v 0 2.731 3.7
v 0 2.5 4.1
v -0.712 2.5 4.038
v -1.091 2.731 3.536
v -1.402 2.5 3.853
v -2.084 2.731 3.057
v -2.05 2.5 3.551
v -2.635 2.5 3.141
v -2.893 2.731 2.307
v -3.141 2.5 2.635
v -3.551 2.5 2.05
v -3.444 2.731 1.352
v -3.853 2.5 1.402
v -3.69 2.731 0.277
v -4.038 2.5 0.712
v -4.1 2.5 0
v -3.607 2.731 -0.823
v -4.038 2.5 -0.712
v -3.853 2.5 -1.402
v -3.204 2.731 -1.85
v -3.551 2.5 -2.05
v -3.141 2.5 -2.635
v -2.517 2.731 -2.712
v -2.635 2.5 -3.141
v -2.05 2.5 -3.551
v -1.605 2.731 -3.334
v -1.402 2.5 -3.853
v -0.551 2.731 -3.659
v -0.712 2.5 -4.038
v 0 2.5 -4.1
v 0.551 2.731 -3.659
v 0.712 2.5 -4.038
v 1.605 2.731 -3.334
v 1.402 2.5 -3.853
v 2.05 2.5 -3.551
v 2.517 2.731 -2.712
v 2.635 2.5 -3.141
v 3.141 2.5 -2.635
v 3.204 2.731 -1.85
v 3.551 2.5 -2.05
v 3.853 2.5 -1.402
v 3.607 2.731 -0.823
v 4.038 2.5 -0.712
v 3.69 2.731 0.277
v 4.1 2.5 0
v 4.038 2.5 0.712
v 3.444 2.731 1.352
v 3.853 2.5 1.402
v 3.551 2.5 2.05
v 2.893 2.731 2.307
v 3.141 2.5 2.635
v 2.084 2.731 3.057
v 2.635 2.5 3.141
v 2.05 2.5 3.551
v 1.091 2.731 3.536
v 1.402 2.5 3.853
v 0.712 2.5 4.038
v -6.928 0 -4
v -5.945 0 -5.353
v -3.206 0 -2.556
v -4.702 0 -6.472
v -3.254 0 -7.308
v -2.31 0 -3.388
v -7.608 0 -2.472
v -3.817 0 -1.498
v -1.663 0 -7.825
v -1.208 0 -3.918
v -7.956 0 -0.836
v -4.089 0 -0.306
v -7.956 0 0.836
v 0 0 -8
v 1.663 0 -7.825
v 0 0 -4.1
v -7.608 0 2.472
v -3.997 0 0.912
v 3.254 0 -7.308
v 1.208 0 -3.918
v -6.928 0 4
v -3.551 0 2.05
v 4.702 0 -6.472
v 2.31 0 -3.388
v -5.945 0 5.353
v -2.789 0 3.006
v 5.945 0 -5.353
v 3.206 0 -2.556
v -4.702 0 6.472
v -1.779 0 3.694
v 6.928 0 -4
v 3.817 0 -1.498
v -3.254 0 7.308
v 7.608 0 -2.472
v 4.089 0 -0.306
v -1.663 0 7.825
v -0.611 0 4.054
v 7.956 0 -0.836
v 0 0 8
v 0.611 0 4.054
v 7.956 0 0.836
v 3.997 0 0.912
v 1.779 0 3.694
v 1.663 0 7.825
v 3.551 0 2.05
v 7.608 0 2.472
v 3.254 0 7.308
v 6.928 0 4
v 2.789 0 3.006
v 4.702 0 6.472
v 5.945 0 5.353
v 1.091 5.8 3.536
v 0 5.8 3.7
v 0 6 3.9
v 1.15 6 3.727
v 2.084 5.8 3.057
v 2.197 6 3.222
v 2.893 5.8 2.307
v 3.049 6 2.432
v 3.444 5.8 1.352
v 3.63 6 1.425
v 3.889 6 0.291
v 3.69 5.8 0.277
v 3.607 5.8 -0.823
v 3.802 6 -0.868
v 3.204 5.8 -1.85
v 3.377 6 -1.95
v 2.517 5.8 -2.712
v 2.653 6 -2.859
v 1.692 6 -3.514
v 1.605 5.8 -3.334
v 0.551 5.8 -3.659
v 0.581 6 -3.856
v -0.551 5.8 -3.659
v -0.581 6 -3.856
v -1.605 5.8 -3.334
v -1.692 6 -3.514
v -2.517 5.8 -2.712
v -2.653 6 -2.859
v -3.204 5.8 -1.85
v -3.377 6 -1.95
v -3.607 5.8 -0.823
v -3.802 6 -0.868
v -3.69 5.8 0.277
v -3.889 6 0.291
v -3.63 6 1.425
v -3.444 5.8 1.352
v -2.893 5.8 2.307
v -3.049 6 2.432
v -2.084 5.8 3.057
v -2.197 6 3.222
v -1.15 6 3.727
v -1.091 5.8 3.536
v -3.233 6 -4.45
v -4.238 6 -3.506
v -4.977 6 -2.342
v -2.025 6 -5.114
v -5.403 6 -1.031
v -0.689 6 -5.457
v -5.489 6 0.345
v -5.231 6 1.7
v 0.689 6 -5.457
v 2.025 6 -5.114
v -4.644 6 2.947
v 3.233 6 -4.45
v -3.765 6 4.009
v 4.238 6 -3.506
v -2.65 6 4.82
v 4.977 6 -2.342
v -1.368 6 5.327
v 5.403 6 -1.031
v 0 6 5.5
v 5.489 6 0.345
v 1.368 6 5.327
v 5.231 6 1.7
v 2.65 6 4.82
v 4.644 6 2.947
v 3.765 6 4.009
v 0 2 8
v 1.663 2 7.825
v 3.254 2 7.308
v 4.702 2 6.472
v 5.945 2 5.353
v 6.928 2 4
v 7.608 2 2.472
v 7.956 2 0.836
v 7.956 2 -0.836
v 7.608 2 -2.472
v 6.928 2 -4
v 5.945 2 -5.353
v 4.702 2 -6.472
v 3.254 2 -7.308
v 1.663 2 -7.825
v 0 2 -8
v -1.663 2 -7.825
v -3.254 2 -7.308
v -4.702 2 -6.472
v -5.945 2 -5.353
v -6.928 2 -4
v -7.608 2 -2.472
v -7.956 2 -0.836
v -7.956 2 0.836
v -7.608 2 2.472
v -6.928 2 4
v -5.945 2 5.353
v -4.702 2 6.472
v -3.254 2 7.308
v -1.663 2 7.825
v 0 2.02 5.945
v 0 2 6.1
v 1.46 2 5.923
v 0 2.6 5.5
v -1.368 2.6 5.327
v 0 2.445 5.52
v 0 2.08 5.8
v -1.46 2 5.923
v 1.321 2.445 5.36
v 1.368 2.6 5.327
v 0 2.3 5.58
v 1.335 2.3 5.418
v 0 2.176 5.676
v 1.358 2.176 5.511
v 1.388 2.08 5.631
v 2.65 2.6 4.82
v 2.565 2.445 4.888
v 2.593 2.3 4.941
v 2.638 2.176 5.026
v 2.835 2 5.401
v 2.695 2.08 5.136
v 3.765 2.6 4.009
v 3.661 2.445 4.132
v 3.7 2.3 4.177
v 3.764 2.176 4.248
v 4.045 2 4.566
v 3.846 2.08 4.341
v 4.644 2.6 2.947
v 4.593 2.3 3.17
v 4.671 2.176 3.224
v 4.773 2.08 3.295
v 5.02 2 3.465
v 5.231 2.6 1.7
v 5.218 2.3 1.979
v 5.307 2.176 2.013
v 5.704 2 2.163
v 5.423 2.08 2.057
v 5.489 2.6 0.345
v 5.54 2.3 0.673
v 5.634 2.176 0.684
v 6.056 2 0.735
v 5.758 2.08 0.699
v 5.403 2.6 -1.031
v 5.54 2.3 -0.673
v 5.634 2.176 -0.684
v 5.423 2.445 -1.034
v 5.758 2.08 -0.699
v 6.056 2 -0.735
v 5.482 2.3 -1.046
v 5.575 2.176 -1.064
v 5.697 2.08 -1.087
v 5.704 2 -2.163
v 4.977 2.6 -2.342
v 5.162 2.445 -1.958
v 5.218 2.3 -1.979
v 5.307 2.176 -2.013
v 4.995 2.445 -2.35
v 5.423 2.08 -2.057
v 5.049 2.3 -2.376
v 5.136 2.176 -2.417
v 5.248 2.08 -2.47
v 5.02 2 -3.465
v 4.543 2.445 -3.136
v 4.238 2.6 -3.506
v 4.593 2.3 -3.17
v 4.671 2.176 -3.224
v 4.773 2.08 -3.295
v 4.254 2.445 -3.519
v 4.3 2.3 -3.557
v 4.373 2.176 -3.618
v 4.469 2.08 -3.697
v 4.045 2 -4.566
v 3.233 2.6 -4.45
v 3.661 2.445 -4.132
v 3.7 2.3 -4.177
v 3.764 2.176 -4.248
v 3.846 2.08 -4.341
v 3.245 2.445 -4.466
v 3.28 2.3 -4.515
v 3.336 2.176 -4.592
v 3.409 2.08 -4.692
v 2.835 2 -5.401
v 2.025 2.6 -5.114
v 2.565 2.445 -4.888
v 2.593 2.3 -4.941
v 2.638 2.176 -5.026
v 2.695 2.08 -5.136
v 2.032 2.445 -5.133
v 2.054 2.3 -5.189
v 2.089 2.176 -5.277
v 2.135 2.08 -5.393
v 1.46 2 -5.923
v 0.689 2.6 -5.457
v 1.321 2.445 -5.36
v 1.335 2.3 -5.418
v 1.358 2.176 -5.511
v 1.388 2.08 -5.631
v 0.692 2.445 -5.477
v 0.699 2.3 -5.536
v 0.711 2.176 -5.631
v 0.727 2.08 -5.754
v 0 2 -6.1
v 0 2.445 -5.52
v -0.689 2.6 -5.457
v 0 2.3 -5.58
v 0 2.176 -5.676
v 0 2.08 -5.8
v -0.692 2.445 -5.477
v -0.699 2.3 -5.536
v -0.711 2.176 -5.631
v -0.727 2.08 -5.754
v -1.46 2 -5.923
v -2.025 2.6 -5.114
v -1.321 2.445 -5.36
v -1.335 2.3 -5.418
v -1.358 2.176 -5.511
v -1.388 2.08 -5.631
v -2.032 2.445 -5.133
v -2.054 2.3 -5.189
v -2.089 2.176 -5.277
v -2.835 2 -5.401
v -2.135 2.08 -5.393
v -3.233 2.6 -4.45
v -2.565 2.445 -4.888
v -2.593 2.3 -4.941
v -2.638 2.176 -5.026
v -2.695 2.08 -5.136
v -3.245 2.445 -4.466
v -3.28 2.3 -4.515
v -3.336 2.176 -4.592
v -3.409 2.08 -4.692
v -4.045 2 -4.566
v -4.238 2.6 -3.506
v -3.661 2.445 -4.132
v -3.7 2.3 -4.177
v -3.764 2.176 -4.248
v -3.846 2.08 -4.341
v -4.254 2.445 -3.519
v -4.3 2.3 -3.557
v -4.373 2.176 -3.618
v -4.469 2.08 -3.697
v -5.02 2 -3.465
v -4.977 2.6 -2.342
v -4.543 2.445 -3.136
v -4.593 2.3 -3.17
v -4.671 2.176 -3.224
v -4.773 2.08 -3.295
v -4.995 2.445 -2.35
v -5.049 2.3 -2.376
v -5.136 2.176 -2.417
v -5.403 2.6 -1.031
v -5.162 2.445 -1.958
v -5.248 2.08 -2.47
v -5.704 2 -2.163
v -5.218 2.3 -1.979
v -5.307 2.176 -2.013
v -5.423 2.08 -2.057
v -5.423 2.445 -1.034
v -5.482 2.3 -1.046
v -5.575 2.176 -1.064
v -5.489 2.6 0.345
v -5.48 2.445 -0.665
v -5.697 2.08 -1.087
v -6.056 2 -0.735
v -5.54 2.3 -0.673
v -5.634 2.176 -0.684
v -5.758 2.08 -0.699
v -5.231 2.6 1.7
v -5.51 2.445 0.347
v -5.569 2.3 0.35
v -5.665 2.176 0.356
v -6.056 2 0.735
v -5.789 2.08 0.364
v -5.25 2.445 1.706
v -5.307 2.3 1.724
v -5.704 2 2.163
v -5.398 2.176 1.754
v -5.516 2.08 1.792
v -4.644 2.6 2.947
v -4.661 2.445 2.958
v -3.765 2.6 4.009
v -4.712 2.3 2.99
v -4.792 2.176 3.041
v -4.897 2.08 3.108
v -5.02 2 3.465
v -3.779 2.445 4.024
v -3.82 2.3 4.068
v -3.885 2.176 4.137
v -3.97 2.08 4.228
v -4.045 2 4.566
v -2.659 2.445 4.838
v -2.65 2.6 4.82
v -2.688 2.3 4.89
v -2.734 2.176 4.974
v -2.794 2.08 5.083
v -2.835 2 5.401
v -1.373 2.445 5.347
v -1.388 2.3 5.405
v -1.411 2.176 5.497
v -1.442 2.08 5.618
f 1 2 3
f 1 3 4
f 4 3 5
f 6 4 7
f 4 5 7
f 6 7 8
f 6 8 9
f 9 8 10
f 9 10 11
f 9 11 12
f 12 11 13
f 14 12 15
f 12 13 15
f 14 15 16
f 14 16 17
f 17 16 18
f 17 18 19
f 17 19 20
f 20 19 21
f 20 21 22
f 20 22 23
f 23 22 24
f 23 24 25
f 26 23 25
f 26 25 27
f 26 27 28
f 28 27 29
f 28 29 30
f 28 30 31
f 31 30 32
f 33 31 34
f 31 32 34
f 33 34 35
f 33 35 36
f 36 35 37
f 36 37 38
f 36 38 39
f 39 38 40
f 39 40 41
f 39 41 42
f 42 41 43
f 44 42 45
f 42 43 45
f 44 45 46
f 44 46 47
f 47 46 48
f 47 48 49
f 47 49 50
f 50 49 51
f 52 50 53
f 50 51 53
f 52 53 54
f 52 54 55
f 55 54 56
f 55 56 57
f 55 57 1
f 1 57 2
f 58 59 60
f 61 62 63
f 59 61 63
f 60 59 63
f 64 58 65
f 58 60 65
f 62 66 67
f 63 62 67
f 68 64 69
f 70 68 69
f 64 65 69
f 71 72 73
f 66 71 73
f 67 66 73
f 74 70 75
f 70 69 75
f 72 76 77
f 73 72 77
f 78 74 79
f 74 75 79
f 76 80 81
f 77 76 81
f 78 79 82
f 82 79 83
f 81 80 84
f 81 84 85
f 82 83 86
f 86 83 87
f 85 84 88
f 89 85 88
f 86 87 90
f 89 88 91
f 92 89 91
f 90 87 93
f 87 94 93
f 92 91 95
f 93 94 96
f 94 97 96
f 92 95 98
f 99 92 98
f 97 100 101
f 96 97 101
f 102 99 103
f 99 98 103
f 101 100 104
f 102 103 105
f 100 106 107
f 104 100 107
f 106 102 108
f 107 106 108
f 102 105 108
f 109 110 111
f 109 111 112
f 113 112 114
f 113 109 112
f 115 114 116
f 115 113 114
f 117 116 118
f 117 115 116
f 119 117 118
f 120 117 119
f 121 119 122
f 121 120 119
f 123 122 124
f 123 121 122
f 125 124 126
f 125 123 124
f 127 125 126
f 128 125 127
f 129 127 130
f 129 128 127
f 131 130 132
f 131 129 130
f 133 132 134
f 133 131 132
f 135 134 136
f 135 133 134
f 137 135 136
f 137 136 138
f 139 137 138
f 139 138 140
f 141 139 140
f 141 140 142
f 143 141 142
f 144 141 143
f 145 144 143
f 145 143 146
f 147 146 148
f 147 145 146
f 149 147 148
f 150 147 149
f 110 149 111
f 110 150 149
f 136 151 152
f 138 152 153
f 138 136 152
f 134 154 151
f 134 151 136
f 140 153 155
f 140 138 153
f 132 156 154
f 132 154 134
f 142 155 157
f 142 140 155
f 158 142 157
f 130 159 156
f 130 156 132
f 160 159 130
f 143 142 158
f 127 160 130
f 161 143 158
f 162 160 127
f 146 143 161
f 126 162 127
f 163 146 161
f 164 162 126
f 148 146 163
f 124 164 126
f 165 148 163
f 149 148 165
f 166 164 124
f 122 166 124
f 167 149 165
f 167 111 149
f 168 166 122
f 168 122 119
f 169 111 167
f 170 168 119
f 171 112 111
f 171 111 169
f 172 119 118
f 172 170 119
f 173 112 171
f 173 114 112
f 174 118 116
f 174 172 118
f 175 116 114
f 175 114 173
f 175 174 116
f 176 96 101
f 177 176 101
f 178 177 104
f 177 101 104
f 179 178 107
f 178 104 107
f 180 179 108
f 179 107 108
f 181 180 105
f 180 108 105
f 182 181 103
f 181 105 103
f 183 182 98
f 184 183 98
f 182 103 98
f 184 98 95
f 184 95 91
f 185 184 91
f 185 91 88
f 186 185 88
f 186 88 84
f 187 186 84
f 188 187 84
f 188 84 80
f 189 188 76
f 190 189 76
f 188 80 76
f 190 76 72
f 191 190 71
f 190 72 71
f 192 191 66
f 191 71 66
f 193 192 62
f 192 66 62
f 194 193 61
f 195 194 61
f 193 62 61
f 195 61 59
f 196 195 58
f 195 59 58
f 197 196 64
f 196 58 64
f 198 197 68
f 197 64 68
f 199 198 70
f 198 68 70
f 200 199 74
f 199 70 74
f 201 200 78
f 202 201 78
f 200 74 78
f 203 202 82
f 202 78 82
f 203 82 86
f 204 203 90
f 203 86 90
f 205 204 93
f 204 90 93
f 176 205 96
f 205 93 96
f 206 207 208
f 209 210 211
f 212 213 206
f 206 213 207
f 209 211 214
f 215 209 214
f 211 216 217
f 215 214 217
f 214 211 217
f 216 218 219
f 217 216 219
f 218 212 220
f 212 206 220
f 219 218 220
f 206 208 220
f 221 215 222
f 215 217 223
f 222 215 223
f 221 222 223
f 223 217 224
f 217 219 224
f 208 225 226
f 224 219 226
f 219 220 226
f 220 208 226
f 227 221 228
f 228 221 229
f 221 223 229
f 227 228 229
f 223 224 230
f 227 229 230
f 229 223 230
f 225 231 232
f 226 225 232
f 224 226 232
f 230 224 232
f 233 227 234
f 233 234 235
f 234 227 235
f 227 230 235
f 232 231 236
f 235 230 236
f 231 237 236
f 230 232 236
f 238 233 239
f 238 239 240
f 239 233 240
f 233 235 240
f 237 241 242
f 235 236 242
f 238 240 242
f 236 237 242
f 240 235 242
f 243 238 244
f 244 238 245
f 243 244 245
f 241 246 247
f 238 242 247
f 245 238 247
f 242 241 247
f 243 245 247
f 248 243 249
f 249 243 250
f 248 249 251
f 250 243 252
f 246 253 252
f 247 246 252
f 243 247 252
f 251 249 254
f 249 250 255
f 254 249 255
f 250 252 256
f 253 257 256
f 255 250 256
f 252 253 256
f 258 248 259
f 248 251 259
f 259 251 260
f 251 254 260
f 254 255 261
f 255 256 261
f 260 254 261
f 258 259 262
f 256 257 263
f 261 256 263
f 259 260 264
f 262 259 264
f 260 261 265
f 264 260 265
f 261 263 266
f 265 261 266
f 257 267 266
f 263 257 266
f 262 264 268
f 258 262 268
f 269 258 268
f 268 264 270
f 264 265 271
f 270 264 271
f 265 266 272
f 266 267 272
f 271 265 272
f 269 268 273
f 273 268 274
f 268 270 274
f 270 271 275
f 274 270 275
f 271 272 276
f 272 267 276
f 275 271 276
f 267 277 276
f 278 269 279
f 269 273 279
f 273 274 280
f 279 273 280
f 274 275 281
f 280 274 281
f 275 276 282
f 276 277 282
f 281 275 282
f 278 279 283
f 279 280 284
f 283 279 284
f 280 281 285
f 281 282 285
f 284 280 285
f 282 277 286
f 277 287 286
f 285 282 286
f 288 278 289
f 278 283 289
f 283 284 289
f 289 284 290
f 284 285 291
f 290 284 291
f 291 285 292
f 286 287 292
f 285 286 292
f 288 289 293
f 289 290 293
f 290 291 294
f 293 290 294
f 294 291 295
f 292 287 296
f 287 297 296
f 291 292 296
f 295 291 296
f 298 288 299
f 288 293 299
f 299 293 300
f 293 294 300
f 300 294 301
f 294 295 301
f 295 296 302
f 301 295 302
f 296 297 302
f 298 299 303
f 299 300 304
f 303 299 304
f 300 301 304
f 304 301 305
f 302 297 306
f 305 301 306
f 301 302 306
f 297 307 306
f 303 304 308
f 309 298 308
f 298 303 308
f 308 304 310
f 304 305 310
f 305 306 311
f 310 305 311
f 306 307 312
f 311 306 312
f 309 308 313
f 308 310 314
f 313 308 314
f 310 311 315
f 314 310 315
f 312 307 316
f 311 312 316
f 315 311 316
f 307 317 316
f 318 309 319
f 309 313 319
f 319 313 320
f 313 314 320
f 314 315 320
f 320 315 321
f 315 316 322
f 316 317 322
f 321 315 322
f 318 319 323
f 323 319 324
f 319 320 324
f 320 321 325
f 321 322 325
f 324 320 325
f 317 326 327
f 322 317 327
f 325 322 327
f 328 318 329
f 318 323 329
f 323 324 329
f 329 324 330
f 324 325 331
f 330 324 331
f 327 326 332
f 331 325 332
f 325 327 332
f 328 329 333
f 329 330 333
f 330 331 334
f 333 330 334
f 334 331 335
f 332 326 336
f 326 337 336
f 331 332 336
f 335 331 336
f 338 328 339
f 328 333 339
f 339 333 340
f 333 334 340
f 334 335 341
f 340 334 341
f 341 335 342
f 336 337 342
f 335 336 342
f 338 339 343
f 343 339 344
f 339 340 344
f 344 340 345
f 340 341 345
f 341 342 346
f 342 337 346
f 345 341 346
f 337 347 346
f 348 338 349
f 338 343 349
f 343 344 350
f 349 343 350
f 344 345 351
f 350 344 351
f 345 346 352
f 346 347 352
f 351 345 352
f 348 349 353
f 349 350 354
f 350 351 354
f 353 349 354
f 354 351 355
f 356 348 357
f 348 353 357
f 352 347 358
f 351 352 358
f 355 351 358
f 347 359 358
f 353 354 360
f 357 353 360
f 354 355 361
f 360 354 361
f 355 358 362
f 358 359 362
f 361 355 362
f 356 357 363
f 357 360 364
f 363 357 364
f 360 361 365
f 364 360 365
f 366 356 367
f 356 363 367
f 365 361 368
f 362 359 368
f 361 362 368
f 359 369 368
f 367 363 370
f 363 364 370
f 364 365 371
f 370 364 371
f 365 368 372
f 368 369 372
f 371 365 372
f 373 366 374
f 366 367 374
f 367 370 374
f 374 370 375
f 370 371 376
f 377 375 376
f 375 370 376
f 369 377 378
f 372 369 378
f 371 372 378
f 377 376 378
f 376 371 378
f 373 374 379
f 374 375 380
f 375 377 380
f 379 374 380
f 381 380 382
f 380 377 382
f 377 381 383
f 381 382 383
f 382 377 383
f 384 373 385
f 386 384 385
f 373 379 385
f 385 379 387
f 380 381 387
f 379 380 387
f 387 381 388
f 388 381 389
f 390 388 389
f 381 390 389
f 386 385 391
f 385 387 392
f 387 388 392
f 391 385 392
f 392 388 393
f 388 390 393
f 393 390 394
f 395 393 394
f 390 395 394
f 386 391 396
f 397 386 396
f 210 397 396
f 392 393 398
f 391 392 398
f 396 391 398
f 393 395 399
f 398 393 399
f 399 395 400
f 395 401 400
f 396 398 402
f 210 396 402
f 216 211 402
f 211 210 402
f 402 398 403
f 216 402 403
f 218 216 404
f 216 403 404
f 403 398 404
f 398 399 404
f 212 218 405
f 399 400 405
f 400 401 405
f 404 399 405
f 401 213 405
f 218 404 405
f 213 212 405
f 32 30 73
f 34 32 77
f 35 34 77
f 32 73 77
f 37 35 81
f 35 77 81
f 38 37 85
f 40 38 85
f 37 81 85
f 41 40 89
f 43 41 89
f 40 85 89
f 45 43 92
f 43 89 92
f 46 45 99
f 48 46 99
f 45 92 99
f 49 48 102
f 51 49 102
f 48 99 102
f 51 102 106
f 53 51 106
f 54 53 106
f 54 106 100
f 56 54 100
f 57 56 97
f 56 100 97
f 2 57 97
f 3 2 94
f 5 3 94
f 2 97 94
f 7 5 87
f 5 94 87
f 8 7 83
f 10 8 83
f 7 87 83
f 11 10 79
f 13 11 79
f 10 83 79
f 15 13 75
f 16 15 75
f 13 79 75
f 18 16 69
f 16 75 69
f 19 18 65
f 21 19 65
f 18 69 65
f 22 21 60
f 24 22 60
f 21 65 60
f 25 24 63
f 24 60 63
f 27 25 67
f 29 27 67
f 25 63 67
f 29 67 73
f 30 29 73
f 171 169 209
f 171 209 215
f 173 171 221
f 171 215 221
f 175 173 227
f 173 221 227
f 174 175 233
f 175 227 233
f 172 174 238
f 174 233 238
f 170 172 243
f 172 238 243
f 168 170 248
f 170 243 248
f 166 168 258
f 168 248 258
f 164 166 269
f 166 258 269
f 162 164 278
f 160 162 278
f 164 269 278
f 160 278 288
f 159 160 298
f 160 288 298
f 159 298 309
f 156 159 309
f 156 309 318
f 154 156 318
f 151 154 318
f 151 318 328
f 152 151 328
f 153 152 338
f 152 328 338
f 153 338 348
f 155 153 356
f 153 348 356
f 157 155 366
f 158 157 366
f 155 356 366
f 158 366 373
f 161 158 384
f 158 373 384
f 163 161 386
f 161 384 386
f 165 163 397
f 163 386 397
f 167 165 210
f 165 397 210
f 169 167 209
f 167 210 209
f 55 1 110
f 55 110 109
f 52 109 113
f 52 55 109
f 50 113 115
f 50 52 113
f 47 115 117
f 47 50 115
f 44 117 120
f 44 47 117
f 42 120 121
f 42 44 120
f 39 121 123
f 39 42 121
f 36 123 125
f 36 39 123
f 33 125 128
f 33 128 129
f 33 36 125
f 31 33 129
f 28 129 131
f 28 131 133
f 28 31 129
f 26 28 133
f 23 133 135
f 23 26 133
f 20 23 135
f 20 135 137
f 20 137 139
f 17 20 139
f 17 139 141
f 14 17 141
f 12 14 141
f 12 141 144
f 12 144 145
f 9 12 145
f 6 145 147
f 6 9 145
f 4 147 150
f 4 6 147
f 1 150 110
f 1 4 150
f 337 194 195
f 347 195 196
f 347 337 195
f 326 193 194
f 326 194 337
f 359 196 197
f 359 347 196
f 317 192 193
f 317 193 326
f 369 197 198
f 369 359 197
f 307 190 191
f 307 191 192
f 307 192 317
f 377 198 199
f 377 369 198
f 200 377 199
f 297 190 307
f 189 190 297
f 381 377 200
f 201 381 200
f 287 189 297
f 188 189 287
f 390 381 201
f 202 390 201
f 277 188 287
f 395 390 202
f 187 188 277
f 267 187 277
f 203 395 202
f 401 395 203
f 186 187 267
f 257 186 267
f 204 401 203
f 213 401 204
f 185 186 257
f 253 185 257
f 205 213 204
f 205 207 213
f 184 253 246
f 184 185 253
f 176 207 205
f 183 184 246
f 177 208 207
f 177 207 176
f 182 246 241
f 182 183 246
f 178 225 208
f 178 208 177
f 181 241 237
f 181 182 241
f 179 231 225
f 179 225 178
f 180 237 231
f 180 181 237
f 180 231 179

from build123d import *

# Parameters (mm, degrees)
SKETCH1_R           = 8
SKETCH1_R_2         = 3.7
BOSS_EXTRUDE1_DEPTH = 2
SKETCH2_R           = 5.5
SKETCH2_R_2         = 3.7
BOSS_EXTRUDE2_DEPTH = 4
FILLET2_R           = 0.6
CHAMFER2_SIZE       = 0.2
SKETCH3_R           = 4.1
CUT_EXTRUDE1_DEPTH  = 2.5
CHAMFER3_SIZE2      = 0.4
CHAMFER3_SIZE       = 0.230940108


with BuildPart() as part:
    # Sketch1 → Boss-Extrude1 (new body)
    with BuildSketch(Plane(origin=(0, 0, 0), x_dir=(1, 0, 0), z_dir=(0, 1, 0))):
        with Locations(Location((0, 0, 0), (0, 0, 270))):
            Circle(SKETCH1_R)
        with Locations(Location((0, 0, 0), (0, 0, 270))):
            Circle(SKETCH1_R_2, mode=Mode.SUBTRACT)
    extrude(amount=BOSS_EXTRUDE1_DEPTH)

    # Sketch2 → Boss-Extrude2 (add)
    with BuildSketch(Plane(origin=(0, 2, 0), x_dir=(1, 0, 0), z_dir=(0, 1, 0))):
        with Locations(Location((0, 0, 0), (0, 0, 270))):
            Circle(SKETCH2_R)
        with Locations(Location((0, 0, 0), (0, 0, 270))):
            Circle(SKETCH2_R_2, mode=Mode.SUBTRACT)
    extrude(amount=BOSS_EXTRUDE2_DEPTH)

    # Fillet2
    fillet2_edges = [part.edges().sort_by_distance(p)[0] for p in [
        (0, 2, -5.5),
    ]]
    fillet(fillet2_edges, radius=FILLET2_R)

    # Chamfer2
    chamfer2_edges = [part.edges().sort_by_distance(p)[0] for p in [
        (0, 6, -3.7),
    ]]
    chamfer(chamfer2_edges, length=CHAMFER2_SIZE)

    # Sketch3 → Cut-Extrude1 (cut)
    with BuildSketch(Plane.XZ):
        with Locations(Location((0, 0, 0), (0, 0, 270))):
            Circle(SKETCH3_R)
    extrude(amount=-CUT_EXTRUDE1_DEPTH, mode=Mode.SUBTRACT)

    # Chamfer3
    chamfer3_edges = [part.edges().sort_by_distance(p)[0] for p in [
        (0, 2.5, -3.7),
    ]]
    chamfer3_side = [part.faces().sort_by_distance(p)[0] for p in [
        (0, 2.504618802, -3.7),
    ]]
    chamfer(chamfer3_edges, length=CHAMFER3_SIZE - 0.0001, length2=CHAMFER3_SIZE2 - 0.0001, reference=chamfer3_side[0])  # a hair under: the kernel refuses the full size


solid = part.part
